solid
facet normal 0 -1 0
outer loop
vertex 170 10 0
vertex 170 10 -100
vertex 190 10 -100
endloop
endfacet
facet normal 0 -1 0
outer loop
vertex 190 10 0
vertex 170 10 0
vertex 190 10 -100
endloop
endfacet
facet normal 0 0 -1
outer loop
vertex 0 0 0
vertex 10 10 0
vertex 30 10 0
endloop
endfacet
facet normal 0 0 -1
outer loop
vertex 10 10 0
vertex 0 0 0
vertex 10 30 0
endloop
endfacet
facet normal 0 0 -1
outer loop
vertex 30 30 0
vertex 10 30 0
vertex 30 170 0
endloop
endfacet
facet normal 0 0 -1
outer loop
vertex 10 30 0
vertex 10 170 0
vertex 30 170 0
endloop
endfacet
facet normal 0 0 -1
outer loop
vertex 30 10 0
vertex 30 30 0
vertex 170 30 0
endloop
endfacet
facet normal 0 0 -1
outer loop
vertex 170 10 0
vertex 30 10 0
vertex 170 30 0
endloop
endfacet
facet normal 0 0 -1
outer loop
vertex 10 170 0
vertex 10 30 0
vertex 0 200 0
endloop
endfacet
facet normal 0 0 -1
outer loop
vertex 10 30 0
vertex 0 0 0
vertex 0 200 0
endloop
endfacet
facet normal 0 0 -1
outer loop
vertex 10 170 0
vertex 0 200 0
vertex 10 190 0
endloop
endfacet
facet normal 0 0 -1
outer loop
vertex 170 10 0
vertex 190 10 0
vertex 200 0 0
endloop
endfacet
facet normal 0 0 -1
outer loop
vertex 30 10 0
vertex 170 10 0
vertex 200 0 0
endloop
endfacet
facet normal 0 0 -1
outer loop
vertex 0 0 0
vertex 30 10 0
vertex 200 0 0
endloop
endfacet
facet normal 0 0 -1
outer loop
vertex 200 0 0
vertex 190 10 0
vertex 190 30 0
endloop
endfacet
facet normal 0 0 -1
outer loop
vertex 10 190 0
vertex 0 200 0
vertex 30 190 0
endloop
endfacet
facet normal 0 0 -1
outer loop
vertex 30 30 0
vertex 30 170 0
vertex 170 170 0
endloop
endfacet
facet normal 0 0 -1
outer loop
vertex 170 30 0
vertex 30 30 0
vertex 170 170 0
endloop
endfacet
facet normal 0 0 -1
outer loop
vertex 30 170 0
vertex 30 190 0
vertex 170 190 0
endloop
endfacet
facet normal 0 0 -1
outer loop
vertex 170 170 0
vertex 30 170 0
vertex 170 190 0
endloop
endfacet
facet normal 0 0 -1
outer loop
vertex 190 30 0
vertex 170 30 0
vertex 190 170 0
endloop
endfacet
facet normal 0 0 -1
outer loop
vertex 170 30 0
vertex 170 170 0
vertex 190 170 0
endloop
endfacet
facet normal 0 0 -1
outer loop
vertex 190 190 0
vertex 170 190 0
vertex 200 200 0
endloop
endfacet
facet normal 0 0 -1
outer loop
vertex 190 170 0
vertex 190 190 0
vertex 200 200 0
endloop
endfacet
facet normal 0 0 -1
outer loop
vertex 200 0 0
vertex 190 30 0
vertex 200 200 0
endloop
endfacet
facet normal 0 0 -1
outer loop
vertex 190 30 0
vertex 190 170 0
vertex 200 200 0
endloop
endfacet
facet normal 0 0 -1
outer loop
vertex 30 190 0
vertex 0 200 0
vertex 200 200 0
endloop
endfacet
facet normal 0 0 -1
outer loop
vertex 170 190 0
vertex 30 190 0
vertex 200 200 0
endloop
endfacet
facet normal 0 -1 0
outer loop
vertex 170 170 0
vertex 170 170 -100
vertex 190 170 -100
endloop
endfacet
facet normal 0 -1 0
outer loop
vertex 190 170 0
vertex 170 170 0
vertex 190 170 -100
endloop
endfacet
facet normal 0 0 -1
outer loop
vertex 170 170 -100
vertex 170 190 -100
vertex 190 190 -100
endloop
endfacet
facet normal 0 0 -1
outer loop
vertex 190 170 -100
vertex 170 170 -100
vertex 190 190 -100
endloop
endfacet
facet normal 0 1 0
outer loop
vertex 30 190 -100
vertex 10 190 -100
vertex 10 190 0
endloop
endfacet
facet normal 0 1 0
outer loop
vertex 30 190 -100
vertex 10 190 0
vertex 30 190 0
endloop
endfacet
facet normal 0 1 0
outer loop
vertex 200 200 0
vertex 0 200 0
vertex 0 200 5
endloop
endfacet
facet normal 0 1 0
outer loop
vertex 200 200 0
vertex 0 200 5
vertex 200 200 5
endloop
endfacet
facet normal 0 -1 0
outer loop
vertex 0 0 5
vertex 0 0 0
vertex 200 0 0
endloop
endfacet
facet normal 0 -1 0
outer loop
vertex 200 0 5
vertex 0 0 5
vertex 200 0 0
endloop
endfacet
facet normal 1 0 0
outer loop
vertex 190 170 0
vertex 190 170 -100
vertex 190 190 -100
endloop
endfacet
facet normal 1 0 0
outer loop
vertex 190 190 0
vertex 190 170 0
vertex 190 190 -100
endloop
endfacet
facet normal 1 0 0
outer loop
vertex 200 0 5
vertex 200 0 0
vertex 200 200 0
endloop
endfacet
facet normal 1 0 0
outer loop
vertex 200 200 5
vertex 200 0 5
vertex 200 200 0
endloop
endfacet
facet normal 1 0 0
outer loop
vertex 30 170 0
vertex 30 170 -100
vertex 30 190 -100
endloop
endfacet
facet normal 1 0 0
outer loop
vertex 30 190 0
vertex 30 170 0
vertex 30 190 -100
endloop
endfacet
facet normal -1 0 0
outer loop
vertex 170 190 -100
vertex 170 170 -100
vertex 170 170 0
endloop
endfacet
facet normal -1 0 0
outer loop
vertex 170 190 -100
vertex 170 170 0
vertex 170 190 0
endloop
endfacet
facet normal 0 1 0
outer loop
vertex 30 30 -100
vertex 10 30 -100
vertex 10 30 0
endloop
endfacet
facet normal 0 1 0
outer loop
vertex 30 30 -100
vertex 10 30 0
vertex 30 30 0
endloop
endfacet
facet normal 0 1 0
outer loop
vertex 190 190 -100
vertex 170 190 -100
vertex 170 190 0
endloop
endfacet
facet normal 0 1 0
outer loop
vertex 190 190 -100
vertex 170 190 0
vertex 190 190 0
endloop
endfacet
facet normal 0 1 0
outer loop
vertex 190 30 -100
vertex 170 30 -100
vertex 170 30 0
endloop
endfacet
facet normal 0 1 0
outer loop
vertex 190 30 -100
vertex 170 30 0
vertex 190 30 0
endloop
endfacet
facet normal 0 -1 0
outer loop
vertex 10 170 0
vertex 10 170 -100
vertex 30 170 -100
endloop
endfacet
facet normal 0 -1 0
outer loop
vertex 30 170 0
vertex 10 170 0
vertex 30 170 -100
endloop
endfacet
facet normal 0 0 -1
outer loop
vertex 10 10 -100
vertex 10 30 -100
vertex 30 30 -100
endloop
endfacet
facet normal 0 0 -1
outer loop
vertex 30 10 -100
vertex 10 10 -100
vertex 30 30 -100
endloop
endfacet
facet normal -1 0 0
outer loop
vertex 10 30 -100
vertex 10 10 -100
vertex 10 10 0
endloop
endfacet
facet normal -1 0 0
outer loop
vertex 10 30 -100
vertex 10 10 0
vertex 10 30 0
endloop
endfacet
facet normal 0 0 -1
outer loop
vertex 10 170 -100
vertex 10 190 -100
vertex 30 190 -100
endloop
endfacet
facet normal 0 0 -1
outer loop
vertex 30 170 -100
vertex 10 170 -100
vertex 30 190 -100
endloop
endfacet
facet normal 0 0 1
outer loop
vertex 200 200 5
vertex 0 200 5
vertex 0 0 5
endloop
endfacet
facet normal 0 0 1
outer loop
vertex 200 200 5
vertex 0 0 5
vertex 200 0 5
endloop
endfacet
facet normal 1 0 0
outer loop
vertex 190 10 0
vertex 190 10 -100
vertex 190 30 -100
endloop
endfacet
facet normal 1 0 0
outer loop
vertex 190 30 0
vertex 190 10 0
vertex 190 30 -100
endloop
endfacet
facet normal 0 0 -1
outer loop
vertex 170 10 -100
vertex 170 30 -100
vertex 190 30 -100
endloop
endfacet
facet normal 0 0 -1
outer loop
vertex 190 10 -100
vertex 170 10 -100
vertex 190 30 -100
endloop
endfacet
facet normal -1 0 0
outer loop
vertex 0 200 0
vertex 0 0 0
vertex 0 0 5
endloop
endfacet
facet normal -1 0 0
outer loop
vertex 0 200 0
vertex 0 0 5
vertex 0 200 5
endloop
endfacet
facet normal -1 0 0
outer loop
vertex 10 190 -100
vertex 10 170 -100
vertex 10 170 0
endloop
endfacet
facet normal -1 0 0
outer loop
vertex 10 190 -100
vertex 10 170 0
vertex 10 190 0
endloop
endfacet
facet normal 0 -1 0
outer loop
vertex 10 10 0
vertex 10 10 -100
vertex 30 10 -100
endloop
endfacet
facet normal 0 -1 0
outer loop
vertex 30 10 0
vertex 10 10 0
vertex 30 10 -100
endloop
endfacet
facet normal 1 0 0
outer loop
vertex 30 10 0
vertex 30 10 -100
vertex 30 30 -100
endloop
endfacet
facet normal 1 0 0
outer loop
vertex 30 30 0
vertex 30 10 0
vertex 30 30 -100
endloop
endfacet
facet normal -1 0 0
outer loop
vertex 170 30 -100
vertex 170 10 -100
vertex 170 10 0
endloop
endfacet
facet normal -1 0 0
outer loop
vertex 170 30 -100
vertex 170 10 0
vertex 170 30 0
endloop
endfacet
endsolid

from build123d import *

# Parameters (mm, degrees)
BOX001_W     = 20
BOX001_H     = 20
BOX001_DEPTH = 101
BOX002_W     = 20
BOX002_H     = 20
BOX002_DEPTH = 101
BOX003_W     = 20
BOX003_H     = 20
BOX003_DEPTH = 101
BOX004_W     = 20
BOX004_H     = 20
BOX004_DEPTH = 101
BOX_W        = 200
BOX_H        = 200
BOX_DEPTH    = 5


with BuildPart() as pata1:
    # Box001 → Box001 (new body)
    with BuildSketch(Plane(origin=(10, 10, -100), x_dir=(1, 0, 0), z_dir=(0, 0, 1))):
        with Locations((10, 10)):
            Rectangle(BOX001_W, BOX001_H)
    extrude(amount=BOX001_DEPTH)


with BuildPart() as box002:
    # Box002 → Box002 (new body)
    with BuildSketch(Plane(origin=(170, 10, -100), x_dir=(1, 0, 0), z_dir=(0, 0, 1))):
        with Locations((10, 10)):
            Rectangle(BOX002_W, BOX002_H)
    extrude(amount=BOX002_DEPTH)


with BuildPart() as box003:
    # Box003 → Box003 (new body)
    with BuildSketch(Plane(origin=(10, 170, -100), x_dir=(1, 0, 0), z_dir=(0, 0, 1))):
        with Locations((10, 10)):
            Rectangle(BOX003_W, BOX003_H)
    extrude(amount=BOX003_DEPTH)


with BuildPart() as box004:
    # Box004 → Box004 (new body)
    with BuildSketch(Plane(origin=(170, 170, -100), x_dir=(1, 0, 0), z_dir=(0, 0, 1))):
        with Locations((10, 10)):
            Rectangle(BOX004_W, BOX004_H)
    extrude(amount=BOX004_DEPTH)


with BuildPart() as mesa:
    # Box → Box (new body)
    with BuildSketch(Plane.XY):
        with Locations((100, 100)):
            Rectangle(BOX_W, BOX_H)
    extrude(amount=BOX_DEPTH)

    # Fusion: union Pata1, Box002, Box003, Box004
    add(pata1.part)
    add(box002.part)
    add(box003.part)
    add(box004.part)


solid = mesa.part
